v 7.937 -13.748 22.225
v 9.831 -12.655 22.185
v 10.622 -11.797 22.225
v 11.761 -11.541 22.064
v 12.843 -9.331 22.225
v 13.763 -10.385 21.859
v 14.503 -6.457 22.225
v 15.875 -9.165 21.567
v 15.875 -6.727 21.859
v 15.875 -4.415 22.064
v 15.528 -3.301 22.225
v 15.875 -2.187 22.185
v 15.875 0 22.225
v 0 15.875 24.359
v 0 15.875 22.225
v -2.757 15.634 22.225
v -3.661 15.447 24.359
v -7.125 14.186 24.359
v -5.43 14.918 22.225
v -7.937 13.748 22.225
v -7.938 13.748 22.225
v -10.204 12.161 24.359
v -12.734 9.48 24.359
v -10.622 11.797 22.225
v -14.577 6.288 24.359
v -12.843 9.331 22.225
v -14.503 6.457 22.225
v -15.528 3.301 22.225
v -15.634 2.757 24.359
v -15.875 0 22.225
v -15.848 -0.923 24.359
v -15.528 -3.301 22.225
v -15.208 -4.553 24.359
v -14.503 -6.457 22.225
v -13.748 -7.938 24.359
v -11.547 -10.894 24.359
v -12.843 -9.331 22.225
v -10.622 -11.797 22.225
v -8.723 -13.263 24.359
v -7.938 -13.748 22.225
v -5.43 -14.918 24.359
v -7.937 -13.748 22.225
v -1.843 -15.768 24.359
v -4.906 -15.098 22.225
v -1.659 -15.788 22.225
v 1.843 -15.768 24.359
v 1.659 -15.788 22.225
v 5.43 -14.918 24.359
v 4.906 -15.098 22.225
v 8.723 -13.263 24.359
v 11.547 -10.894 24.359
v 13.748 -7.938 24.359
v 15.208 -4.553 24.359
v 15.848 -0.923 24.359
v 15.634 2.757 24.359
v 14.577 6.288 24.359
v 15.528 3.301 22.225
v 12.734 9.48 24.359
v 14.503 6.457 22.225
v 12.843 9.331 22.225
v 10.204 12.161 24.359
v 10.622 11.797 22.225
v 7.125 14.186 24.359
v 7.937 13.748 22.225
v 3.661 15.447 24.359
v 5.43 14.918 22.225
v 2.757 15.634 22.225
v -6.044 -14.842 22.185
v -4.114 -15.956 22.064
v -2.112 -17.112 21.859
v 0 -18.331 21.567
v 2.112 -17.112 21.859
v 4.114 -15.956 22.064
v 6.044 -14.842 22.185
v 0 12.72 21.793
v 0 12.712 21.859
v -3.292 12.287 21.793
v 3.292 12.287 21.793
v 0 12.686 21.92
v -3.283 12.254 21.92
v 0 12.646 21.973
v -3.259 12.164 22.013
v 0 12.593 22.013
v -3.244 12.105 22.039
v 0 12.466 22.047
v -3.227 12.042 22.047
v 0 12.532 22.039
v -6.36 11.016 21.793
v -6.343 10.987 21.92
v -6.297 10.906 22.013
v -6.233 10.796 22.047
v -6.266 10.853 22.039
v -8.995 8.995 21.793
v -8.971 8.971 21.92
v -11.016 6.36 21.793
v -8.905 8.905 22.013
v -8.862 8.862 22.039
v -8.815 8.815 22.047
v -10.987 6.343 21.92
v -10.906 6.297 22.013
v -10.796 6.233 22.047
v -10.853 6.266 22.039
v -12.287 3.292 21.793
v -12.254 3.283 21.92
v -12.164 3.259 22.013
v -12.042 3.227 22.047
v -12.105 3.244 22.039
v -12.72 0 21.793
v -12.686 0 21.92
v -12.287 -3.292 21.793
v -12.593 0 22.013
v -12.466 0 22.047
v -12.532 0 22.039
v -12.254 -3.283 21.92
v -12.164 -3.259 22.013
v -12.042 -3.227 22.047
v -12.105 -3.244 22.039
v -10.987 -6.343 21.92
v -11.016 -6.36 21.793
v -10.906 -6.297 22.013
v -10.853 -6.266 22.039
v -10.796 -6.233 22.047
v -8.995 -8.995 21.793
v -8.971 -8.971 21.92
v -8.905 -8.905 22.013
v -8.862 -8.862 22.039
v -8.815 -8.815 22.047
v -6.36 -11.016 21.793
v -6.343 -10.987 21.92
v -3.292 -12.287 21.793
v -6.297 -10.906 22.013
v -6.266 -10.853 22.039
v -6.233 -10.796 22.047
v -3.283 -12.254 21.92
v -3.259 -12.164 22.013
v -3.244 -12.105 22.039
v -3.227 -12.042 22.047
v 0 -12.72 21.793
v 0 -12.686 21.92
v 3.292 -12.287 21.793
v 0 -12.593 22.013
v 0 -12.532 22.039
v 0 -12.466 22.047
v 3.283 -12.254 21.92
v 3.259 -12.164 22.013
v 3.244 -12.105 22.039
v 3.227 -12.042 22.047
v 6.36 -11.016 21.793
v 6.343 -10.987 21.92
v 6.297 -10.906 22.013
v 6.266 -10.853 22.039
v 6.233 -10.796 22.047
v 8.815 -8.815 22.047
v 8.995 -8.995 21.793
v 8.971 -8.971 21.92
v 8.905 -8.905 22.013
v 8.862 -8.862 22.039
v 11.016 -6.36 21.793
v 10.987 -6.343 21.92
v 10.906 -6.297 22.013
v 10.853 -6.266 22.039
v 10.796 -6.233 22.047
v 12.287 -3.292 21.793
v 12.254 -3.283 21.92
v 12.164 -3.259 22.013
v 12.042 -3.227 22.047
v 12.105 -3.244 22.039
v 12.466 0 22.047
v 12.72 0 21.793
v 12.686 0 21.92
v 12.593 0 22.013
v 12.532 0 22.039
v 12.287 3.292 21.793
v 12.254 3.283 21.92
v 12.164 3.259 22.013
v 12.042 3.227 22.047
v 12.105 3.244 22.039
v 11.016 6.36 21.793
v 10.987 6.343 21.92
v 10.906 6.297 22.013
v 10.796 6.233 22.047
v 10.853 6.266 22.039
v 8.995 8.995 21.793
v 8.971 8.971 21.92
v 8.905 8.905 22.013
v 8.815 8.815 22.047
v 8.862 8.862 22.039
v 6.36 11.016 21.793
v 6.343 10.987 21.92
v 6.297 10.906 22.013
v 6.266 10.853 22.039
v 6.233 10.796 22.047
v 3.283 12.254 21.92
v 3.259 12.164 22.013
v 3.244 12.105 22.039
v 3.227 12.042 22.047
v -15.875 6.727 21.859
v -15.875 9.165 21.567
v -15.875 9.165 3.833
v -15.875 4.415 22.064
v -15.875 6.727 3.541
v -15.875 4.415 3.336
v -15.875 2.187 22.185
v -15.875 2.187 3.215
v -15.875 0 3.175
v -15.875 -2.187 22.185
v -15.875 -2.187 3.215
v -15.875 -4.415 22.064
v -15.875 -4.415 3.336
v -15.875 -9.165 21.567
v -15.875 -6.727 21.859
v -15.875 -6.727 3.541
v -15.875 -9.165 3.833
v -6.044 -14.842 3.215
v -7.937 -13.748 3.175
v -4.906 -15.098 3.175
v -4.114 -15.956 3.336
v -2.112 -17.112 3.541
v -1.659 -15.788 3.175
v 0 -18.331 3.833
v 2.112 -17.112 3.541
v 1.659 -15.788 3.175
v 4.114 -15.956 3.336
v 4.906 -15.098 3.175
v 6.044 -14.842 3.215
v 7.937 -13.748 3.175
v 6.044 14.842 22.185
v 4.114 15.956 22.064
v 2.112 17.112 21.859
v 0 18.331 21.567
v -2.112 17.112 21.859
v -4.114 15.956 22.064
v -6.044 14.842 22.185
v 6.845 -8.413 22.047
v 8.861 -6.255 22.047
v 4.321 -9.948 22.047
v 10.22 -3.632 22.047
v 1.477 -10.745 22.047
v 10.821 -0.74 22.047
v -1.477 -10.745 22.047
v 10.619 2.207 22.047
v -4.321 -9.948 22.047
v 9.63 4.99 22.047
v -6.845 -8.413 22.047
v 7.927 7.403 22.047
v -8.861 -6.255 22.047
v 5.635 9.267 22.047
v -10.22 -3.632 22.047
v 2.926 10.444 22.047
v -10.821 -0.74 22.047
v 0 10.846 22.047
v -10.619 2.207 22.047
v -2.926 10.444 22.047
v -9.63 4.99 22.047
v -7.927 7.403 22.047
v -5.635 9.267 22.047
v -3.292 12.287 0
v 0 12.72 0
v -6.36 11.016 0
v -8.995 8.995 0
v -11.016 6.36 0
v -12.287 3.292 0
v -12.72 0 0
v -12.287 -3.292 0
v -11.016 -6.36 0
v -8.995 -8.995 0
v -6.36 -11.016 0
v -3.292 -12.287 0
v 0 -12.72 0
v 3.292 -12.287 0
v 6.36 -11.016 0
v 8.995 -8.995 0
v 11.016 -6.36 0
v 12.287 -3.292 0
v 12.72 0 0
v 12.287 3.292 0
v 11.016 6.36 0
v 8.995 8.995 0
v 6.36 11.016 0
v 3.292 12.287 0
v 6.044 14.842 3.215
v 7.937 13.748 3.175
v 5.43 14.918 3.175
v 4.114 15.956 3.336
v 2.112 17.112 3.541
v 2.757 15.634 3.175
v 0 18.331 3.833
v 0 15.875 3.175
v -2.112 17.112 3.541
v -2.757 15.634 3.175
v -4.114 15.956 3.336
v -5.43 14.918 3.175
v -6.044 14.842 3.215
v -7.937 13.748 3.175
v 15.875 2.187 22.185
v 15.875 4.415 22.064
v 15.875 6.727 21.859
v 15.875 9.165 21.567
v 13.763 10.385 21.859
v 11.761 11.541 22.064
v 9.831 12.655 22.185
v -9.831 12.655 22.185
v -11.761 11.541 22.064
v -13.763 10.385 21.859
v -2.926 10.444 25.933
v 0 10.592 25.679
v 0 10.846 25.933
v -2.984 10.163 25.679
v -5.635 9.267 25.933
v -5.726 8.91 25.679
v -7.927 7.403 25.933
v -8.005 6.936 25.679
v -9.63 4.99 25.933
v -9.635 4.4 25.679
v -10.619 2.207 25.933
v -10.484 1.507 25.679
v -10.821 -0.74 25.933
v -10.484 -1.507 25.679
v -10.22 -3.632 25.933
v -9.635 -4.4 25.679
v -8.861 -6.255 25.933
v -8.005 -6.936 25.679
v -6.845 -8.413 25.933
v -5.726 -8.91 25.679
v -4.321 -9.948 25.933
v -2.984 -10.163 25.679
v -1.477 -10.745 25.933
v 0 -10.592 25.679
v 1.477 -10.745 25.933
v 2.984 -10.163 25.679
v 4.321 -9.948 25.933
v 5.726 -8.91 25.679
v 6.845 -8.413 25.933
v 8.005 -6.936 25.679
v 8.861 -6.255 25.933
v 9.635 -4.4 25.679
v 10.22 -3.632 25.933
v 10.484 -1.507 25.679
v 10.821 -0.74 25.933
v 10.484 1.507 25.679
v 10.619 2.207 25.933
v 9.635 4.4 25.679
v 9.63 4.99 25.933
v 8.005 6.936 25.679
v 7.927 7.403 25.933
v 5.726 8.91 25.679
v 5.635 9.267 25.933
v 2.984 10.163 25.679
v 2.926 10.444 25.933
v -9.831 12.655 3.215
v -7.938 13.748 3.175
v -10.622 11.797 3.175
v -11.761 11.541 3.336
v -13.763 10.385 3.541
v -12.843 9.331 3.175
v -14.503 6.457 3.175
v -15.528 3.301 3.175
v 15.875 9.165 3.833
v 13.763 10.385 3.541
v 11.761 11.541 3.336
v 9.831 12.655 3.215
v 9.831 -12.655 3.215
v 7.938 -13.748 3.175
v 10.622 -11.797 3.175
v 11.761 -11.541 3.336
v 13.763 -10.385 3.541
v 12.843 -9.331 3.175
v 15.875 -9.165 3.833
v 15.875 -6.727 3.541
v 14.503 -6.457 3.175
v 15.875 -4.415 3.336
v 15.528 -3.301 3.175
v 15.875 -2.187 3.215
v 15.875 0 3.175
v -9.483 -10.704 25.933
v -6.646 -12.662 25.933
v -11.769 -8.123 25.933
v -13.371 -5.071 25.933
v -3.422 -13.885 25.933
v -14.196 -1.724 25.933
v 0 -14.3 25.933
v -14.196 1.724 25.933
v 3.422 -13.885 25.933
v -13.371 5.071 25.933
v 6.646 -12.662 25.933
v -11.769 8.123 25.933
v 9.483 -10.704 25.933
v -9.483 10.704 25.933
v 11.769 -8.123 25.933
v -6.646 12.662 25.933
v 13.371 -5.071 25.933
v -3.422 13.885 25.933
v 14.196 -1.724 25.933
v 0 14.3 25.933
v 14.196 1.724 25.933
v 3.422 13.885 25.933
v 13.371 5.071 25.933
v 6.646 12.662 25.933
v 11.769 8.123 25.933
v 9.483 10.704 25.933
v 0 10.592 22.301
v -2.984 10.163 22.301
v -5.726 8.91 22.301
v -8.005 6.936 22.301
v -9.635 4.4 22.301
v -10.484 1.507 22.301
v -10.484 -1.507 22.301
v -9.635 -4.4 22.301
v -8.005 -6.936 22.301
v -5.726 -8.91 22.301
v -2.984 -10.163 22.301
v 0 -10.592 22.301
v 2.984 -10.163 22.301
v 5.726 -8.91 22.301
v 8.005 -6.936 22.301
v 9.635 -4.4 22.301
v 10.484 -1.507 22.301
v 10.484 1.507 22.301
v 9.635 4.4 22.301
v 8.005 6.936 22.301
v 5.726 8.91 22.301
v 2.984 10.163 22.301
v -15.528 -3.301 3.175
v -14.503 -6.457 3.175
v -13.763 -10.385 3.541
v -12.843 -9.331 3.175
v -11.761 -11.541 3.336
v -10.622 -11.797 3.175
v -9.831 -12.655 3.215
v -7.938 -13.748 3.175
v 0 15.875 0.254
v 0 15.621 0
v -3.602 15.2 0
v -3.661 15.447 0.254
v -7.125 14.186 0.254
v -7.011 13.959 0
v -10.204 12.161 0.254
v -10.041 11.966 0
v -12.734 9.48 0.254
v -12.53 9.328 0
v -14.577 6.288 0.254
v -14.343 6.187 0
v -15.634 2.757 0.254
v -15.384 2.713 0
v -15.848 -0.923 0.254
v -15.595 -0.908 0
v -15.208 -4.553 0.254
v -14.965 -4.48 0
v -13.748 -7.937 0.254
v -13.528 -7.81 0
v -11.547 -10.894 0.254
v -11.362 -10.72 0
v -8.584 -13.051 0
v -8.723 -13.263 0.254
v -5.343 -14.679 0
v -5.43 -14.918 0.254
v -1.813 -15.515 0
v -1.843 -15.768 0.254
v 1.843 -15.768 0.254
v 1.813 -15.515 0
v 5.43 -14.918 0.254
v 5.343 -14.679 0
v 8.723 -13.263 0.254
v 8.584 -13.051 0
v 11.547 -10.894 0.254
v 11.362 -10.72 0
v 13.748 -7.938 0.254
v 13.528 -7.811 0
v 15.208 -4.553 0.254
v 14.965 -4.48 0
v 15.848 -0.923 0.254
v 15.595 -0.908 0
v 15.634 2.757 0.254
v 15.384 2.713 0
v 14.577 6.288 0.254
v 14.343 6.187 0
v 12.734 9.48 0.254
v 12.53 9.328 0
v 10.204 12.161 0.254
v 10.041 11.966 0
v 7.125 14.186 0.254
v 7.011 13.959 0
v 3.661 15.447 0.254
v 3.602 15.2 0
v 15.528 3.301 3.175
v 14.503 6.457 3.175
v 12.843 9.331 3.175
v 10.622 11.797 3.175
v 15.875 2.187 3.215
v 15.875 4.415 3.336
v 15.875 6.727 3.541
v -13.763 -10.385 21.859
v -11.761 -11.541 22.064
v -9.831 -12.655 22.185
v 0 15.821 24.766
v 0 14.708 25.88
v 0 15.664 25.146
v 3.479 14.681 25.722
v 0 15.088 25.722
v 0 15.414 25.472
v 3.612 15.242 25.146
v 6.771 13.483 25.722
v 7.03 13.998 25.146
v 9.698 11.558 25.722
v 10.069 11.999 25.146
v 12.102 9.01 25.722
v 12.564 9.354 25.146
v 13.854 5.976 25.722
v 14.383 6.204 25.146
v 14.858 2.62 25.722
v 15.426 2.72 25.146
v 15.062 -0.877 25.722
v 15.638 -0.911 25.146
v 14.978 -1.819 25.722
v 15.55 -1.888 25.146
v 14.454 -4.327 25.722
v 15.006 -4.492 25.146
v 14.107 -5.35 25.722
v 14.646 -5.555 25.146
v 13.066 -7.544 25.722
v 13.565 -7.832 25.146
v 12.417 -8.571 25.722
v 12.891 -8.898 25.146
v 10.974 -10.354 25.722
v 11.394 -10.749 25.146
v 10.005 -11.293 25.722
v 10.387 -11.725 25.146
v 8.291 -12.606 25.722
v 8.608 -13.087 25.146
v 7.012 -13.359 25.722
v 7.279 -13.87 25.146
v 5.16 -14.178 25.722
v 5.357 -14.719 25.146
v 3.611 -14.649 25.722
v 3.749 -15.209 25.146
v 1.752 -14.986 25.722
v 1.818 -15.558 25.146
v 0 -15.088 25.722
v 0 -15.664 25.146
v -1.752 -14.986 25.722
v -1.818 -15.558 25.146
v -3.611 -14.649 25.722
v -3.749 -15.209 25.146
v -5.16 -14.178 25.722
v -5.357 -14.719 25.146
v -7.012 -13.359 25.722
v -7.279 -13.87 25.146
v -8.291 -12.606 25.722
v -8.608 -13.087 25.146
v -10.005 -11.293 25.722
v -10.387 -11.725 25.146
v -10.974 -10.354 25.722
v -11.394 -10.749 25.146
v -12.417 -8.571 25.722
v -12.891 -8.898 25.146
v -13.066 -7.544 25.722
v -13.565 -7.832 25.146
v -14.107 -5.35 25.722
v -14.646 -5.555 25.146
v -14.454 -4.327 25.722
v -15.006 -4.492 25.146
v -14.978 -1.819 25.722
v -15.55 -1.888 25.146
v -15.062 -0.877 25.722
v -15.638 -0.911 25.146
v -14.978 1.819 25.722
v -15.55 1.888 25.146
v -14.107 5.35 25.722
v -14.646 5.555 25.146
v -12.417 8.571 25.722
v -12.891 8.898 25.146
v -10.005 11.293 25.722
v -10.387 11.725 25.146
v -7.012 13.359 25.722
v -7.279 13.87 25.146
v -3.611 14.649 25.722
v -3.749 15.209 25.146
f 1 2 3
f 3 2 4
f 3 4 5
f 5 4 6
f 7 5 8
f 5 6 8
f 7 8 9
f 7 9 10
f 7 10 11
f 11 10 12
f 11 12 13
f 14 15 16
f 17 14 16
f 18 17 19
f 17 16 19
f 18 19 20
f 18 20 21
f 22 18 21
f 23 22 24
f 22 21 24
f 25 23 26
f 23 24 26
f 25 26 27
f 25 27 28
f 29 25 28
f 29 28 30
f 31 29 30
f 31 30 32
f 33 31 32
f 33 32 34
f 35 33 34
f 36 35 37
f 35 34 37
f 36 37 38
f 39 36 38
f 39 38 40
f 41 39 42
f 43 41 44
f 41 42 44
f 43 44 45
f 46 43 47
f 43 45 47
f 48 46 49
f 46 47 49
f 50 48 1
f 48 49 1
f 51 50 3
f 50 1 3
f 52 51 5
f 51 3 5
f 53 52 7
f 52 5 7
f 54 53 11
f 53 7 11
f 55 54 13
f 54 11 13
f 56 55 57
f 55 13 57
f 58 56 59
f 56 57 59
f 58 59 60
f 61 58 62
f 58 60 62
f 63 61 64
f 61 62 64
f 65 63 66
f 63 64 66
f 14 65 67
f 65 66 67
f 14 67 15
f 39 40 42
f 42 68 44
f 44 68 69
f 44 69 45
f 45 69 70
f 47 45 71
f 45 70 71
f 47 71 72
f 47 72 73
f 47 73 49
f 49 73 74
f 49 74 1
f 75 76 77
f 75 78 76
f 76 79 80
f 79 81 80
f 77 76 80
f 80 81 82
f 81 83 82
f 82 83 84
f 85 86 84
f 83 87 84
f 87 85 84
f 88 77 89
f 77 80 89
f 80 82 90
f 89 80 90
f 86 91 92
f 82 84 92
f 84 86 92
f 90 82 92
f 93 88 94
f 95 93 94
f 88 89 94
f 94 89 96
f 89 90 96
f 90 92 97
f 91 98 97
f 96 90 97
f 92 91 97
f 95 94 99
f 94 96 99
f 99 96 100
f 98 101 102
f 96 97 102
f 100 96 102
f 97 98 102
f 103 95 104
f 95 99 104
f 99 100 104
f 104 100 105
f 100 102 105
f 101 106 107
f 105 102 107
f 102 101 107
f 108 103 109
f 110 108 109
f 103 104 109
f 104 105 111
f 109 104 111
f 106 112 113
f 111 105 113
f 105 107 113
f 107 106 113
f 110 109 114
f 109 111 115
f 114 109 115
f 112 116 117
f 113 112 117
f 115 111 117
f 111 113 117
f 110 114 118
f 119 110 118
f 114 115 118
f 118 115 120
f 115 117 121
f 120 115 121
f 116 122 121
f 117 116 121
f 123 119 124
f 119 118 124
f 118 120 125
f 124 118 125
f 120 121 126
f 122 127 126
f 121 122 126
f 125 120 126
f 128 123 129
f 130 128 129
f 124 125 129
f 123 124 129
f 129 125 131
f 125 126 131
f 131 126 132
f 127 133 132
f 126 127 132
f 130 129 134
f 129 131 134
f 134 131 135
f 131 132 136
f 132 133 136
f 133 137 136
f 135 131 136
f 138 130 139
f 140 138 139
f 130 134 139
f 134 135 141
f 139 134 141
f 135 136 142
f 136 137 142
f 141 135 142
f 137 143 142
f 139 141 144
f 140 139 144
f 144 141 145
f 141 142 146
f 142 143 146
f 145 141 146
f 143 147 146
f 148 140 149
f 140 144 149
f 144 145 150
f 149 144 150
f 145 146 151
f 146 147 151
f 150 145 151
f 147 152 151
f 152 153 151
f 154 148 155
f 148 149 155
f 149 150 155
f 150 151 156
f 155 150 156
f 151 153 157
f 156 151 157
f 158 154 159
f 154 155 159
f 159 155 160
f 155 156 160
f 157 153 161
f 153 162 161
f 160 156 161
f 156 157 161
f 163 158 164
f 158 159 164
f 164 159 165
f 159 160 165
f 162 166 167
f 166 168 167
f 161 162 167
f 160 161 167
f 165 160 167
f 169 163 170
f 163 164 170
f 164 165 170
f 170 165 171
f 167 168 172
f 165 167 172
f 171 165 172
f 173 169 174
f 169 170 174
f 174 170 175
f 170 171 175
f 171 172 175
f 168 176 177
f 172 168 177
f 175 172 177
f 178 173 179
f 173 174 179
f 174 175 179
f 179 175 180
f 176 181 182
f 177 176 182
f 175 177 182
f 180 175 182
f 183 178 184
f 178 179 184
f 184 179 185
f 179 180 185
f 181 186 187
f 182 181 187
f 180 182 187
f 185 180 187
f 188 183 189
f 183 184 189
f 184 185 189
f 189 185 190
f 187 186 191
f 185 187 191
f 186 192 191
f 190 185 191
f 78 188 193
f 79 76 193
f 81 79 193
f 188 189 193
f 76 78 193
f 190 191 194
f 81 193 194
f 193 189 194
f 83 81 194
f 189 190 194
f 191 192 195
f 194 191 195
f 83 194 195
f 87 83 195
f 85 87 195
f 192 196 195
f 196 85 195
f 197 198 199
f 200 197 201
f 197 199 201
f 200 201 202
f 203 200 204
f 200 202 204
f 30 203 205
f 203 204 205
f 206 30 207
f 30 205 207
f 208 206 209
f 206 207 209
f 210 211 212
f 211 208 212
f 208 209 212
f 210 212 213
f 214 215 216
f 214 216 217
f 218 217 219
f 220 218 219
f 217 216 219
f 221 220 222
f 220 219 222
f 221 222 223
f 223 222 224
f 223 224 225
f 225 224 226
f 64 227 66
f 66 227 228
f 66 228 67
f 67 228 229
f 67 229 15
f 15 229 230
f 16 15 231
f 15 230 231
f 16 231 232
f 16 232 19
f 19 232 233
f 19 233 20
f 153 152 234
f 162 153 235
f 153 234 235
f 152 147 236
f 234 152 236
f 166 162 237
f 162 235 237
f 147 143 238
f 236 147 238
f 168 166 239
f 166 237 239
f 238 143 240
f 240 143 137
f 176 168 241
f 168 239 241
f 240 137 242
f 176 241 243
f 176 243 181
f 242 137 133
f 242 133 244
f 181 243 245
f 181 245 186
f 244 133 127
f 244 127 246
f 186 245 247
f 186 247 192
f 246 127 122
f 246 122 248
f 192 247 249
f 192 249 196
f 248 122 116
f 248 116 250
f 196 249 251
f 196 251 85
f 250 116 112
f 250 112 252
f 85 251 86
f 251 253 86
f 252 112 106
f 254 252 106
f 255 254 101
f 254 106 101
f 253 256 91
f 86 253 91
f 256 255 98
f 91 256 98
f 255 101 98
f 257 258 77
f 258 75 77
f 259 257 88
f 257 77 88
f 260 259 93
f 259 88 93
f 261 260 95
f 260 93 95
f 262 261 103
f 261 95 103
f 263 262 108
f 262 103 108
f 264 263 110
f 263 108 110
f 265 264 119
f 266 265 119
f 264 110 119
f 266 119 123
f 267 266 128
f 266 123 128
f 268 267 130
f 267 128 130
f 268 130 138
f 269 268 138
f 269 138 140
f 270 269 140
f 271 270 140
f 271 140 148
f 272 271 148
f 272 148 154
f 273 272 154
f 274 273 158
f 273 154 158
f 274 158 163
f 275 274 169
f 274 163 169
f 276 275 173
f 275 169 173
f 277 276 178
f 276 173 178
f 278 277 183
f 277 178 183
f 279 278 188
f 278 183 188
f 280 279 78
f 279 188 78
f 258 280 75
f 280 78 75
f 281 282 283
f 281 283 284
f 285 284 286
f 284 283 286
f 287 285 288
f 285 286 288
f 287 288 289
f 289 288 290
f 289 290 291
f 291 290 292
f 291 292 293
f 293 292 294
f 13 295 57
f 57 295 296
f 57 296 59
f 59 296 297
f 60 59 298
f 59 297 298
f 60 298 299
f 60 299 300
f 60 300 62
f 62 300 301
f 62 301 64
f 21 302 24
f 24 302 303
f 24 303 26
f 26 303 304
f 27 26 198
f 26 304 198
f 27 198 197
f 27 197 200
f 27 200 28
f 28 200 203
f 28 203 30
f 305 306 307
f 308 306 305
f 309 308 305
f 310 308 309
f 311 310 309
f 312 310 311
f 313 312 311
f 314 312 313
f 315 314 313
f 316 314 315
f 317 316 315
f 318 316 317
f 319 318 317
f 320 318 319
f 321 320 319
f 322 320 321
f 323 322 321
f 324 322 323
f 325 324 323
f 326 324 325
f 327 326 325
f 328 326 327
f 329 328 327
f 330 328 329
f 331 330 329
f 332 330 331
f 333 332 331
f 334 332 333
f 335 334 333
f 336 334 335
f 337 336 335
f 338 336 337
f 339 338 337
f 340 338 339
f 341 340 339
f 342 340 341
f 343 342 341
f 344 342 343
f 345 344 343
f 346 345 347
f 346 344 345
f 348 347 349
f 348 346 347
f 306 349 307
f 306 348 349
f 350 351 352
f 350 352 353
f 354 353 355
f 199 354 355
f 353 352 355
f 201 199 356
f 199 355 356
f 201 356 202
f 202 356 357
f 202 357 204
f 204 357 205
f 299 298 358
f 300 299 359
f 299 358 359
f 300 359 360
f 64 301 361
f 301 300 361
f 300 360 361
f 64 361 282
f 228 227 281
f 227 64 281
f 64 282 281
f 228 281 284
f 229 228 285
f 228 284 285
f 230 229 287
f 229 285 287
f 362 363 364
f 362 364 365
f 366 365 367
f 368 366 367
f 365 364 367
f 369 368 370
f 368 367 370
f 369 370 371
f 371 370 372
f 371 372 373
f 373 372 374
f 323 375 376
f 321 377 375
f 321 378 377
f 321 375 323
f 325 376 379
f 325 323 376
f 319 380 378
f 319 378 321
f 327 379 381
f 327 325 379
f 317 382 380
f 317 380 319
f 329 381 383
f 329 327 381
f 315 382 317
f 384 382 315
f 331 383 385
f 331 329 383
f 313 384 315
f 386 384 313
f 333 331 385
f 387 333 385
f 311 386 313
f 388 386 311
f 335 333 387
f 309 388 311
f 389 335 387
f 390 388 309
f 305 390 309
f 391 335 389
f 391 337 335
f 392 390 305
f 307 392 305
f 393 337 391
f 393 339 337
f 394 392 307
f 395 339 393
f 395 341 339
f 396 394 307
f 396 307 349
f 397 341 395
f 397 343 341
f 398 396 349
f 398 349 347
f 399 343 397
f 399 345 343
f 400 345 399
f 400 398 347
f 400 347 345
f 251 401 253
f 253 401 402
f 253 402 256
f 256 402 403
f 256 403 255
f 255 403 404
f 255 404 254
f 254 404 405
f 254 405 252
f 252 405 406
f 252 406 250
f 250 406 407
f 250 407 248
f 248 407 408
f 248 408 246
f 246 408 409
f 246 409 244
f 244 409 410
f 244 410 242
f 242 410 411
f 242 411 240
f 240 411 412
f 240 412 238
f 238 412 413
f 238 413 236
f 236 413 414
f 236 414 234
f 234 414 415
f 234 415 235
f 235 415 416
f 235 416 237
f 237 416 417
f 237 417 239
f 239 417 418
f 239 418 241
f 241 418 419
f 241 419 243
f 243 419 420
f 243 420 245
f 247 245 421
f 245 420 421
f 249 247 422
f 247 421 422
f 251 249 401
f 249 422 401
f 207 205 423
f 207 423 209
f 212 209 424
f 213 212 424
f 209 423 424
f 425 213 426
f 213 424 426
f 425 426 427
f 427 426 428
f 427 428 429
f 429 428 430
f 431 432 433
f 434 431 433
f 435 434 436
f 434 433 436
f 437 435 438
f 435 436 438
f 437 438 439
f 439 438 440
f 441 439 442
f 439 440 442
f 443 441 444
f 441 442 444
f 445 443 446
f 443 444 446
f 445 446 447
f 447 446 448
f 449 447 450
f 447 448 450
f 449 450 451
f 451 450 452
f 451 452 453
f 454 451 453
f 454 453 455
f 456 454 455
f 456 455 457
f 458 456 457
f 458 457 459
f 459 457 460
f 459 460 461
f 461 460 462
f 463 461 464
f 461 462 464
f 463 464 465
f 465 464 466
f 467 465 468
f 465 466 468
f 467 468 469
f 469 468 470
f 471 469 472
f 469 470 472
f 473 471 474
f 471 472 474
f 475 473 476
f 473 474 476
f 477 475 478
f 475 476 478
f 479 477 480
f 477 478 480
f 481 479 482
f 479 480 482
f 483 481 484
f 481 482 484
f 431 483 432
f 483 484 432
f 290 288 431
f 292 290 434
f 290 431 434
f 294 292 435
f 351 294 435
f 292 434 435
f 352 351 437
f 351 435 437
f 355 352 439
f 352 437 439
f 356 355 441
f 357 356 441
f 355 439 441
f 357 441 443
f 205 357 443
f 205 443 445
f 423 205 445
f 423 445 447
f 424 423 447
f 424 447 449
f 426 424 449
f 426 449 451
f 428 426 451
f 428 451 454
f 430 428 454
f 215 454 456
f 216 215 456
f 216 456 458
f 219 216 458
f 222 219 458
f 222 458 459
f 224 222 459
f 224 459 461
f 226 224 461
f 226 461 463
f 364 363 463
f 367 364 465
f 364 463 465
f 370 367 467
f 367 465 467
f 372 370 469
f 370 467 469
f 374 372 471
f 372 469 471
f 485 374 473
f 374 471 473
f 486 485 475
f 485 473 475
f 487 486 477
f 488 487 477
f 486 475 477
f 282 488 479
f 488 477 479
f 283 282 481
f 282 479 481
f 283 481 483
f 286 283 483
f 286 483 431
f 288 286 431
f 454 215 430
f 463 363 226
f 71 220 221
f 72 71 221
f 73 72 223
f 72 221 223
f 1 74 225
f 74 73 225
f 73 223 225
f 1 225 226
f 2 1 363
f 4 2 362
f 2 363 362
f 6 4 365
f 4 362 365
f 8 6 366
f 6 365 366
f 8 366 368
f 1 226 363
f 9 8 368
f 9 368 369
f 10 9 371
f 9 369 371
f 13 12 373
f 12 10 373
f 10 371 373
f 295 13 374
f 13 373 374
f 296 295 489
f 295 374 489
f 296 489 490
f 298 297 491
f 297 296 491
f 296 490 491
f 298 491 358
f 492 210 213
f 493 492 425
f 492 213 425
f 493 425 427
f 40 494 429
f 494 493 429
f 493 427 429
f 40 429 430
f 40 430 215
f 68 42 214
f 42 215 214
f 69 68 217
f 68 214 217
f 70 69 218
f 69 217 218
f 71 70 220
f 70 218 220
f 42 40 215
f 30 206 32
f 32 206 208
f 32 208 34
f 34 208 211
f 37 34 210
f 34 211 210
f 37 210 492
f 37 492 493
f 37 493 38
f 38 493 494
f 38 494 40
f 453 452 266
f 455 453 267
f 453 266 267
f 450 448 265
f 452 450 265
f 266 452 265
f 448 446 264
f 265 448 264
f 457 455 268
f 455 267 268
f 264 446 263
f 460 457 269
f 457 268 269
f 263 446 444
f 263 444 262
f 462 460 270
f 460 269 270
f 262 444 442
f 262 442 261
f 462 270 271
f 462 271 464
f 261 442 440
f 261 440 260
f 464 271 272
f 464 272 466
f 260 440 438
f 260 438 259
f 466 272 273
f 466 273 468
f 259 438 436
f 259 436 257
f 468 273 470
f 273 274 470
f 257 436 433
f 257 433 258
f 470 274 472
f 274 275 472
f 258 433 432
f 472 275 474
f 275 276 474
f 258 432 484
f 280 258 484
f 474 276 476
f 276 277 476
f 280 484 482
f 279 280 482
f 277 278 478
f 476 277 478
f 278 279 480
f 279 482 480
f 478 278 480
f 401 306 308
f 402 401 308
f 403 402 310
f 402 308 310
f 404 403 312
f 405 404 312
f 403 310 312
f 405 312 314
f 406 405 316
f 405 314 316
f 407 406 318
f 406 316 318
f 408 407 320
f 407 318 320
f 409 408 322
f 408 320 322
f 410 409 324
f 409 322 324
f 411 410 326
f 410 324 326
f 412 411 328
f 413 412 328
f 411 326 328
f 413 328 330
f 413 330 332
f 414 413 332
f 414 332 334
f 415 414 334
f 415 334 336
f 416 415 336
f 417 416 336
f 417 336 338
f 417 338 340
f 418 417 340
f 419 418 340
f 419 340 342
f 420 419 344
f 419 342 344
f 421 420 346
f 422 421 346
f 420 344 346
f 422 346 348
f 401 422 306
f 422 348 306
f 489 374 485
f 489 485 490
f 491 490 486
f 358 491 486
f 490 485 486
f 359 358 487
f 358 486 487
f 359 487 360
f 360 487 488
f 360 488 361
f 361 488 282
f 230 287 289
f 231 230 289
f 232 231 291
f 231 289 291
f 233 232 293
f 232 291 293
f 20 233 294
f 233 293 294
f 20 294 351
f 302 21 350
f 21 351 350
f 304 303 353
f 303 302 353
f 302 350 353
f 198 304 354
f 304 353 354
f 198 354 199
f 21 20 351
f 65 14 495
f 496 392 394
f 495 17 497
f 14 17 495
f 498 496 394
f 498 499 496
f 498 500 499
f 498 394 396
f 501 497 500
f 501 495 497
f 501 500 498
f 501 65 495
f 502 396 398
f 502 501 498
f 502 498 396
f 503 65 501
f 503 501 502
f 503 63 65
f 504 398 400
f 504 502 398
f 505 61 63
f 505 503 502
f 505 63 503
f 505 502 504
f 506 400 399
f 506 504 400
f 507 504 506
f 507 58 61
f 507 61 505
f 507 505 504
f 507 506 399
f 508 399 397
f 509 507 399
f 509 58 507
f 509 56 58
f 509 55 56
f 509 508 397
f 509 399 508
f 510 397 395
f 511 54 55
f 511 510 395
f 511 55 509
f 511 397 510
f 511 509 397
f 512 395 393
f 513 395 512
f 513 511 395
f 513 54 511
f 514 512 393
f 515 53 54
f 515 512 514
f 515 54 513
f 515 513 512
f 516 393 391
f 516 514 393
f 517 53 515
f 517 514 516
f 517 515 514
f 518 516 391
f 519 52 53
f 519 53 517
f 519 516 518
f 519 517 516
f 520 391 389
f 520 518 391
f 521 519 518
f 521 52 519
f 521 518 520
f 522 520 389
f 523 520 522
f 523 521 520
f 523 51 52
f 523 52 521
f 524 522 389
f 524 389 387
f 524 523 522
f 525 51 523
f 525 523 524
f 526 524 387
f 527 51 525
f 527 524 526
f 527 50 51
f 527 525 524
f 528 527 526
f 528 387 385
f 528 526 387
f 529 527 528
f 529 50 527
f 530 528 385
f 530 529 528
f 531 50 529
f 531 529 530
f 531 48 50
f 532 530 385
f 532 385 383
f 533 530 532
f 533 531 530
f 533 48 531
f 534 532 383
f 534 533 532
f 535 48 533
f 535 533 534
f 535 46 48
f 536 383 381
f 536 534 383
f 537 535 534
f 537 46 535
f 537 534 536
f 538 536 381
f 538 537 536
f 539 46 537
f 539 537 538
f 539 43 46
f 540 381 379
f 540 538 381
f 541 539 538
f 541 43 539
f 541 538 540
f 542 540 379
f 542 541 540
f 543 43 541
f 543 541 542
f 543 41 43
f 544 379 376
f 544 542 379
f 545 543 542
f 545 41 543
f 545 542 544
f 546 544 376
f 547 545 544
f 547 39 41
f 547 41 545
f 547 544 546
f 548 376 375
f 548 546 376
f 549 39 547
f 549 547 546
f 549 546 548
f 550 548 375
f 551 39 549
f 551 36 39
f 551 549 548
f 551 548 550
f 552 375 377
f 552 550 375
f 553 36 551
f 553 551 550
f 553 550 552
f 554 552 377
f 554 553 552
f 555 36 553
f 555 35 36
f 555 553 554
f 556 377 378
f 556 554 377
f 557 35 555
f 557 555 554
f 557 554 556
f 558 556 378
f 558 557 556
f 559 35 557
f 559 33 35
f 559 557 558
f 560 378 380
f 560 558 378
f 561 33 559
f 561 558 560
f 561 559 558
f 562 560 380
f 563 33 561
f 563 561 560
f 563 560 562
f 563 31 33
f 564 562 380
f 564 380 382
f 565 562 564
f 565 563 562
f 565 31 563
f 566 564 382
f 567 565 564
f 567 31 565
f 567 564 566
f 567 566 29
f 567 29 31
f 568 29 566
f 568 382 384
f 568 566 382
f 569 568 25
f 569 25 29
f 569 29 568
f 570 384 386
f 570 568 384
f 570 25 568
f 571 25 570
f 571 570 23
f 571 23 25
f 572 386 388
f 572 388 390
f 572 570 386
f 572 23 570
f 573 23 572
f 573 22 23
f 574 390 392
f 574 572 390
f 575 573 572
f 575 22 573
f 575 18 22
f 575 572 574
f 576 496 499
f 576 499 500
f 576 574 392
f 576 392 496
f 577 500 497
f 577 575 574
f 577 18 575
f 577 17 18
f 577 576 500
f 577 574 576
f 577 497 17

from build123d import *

# Parameters (mm, degrees)
BOSS_EXTRUDE1_DEPTH = 25.9334
FILLET1_R           = 1.5748
CHAMFER1_SIZE       = 0.254
CHAMFER2_SIZE       = 0.254


with BuildPart() as part:
    # Sketch1 → Boss-Extrude1 (new body)
    with BuildSketch(Plane.XY):
        Polygon((0, 18.330871047), (-15.875, 9.165435523), (-15.875, -9.165435523), (0, -18.330871047), (15.875, -9.165435523), (15.875, 9.165435523), align=None)
    extrude(amount=BOSS_EXTRUDE1_DEPTH)

    # Sketch2 → Cut-Revolve1 (revolve, cut)
    with BuildSketch(Plane(origin=(0, 0, 0), x_dir=(0, 0, -1), z_dir=(1, 0, 0))):
        Polygon((-25.9334, 20.786742094), (-25.9334, 15.875), (-22.225, 15.875), (-21.566951336, 18.330871047), (-3.833048664, 18.330871047), (-3.175, 15.875), (0, 15.875), (0, 20.786742094), align=None)
        with BuildLine():
            Line((-25.9334, 10.5918), (-25.9334, 0))
            Line((-25.9334, 0), (0, 0))
            Line((0, 0), (0, 12.720416378))
            Line((0, 12.720416378), (-21.7932, 12.720416378))
            ThreePointArc((-21.7932, 12.720416378), (-21.972805122, 12.6460215), (-22.0472, 12.466416378))
            Line((-22.0472, 12.466416378), (-22.0472, 10.5918))
            Line((-22.0472, 10.5918), (-25.9334, 10.5918))
        make_face()
    revolve(axis=Axis((0, 0, 0), (0, 0, 1)), mode=Mode.SUBTRACT)

    # Fillet1
    fillet1_edges = [part.edges().sort_by_distance(p)[0] for p in [
        (0, -15.875, 25.9334),
    ]]
    fillet(fillet1_edges, radius=FILLET1_R)

    # Chamfer1
    chamfer1_edges = [part.edges().sort_by_distance(p)[0] for p in [
        (0, -15.875, 0),
    ]]
    chamfer(chamfer1_edges, length=CHAMFER1_SIZE)

    # Chamfer2
    chamfer2_edges = [part.edges().sort_by_distance(p)[0] for p in [
        (0, -10.5918, 25.9334),
        (0, -10.5918, 22.0472),
    ]]
    chamfer(chamfer2_edges, length=CHAMFER2_SIZE)


solid = part.part
